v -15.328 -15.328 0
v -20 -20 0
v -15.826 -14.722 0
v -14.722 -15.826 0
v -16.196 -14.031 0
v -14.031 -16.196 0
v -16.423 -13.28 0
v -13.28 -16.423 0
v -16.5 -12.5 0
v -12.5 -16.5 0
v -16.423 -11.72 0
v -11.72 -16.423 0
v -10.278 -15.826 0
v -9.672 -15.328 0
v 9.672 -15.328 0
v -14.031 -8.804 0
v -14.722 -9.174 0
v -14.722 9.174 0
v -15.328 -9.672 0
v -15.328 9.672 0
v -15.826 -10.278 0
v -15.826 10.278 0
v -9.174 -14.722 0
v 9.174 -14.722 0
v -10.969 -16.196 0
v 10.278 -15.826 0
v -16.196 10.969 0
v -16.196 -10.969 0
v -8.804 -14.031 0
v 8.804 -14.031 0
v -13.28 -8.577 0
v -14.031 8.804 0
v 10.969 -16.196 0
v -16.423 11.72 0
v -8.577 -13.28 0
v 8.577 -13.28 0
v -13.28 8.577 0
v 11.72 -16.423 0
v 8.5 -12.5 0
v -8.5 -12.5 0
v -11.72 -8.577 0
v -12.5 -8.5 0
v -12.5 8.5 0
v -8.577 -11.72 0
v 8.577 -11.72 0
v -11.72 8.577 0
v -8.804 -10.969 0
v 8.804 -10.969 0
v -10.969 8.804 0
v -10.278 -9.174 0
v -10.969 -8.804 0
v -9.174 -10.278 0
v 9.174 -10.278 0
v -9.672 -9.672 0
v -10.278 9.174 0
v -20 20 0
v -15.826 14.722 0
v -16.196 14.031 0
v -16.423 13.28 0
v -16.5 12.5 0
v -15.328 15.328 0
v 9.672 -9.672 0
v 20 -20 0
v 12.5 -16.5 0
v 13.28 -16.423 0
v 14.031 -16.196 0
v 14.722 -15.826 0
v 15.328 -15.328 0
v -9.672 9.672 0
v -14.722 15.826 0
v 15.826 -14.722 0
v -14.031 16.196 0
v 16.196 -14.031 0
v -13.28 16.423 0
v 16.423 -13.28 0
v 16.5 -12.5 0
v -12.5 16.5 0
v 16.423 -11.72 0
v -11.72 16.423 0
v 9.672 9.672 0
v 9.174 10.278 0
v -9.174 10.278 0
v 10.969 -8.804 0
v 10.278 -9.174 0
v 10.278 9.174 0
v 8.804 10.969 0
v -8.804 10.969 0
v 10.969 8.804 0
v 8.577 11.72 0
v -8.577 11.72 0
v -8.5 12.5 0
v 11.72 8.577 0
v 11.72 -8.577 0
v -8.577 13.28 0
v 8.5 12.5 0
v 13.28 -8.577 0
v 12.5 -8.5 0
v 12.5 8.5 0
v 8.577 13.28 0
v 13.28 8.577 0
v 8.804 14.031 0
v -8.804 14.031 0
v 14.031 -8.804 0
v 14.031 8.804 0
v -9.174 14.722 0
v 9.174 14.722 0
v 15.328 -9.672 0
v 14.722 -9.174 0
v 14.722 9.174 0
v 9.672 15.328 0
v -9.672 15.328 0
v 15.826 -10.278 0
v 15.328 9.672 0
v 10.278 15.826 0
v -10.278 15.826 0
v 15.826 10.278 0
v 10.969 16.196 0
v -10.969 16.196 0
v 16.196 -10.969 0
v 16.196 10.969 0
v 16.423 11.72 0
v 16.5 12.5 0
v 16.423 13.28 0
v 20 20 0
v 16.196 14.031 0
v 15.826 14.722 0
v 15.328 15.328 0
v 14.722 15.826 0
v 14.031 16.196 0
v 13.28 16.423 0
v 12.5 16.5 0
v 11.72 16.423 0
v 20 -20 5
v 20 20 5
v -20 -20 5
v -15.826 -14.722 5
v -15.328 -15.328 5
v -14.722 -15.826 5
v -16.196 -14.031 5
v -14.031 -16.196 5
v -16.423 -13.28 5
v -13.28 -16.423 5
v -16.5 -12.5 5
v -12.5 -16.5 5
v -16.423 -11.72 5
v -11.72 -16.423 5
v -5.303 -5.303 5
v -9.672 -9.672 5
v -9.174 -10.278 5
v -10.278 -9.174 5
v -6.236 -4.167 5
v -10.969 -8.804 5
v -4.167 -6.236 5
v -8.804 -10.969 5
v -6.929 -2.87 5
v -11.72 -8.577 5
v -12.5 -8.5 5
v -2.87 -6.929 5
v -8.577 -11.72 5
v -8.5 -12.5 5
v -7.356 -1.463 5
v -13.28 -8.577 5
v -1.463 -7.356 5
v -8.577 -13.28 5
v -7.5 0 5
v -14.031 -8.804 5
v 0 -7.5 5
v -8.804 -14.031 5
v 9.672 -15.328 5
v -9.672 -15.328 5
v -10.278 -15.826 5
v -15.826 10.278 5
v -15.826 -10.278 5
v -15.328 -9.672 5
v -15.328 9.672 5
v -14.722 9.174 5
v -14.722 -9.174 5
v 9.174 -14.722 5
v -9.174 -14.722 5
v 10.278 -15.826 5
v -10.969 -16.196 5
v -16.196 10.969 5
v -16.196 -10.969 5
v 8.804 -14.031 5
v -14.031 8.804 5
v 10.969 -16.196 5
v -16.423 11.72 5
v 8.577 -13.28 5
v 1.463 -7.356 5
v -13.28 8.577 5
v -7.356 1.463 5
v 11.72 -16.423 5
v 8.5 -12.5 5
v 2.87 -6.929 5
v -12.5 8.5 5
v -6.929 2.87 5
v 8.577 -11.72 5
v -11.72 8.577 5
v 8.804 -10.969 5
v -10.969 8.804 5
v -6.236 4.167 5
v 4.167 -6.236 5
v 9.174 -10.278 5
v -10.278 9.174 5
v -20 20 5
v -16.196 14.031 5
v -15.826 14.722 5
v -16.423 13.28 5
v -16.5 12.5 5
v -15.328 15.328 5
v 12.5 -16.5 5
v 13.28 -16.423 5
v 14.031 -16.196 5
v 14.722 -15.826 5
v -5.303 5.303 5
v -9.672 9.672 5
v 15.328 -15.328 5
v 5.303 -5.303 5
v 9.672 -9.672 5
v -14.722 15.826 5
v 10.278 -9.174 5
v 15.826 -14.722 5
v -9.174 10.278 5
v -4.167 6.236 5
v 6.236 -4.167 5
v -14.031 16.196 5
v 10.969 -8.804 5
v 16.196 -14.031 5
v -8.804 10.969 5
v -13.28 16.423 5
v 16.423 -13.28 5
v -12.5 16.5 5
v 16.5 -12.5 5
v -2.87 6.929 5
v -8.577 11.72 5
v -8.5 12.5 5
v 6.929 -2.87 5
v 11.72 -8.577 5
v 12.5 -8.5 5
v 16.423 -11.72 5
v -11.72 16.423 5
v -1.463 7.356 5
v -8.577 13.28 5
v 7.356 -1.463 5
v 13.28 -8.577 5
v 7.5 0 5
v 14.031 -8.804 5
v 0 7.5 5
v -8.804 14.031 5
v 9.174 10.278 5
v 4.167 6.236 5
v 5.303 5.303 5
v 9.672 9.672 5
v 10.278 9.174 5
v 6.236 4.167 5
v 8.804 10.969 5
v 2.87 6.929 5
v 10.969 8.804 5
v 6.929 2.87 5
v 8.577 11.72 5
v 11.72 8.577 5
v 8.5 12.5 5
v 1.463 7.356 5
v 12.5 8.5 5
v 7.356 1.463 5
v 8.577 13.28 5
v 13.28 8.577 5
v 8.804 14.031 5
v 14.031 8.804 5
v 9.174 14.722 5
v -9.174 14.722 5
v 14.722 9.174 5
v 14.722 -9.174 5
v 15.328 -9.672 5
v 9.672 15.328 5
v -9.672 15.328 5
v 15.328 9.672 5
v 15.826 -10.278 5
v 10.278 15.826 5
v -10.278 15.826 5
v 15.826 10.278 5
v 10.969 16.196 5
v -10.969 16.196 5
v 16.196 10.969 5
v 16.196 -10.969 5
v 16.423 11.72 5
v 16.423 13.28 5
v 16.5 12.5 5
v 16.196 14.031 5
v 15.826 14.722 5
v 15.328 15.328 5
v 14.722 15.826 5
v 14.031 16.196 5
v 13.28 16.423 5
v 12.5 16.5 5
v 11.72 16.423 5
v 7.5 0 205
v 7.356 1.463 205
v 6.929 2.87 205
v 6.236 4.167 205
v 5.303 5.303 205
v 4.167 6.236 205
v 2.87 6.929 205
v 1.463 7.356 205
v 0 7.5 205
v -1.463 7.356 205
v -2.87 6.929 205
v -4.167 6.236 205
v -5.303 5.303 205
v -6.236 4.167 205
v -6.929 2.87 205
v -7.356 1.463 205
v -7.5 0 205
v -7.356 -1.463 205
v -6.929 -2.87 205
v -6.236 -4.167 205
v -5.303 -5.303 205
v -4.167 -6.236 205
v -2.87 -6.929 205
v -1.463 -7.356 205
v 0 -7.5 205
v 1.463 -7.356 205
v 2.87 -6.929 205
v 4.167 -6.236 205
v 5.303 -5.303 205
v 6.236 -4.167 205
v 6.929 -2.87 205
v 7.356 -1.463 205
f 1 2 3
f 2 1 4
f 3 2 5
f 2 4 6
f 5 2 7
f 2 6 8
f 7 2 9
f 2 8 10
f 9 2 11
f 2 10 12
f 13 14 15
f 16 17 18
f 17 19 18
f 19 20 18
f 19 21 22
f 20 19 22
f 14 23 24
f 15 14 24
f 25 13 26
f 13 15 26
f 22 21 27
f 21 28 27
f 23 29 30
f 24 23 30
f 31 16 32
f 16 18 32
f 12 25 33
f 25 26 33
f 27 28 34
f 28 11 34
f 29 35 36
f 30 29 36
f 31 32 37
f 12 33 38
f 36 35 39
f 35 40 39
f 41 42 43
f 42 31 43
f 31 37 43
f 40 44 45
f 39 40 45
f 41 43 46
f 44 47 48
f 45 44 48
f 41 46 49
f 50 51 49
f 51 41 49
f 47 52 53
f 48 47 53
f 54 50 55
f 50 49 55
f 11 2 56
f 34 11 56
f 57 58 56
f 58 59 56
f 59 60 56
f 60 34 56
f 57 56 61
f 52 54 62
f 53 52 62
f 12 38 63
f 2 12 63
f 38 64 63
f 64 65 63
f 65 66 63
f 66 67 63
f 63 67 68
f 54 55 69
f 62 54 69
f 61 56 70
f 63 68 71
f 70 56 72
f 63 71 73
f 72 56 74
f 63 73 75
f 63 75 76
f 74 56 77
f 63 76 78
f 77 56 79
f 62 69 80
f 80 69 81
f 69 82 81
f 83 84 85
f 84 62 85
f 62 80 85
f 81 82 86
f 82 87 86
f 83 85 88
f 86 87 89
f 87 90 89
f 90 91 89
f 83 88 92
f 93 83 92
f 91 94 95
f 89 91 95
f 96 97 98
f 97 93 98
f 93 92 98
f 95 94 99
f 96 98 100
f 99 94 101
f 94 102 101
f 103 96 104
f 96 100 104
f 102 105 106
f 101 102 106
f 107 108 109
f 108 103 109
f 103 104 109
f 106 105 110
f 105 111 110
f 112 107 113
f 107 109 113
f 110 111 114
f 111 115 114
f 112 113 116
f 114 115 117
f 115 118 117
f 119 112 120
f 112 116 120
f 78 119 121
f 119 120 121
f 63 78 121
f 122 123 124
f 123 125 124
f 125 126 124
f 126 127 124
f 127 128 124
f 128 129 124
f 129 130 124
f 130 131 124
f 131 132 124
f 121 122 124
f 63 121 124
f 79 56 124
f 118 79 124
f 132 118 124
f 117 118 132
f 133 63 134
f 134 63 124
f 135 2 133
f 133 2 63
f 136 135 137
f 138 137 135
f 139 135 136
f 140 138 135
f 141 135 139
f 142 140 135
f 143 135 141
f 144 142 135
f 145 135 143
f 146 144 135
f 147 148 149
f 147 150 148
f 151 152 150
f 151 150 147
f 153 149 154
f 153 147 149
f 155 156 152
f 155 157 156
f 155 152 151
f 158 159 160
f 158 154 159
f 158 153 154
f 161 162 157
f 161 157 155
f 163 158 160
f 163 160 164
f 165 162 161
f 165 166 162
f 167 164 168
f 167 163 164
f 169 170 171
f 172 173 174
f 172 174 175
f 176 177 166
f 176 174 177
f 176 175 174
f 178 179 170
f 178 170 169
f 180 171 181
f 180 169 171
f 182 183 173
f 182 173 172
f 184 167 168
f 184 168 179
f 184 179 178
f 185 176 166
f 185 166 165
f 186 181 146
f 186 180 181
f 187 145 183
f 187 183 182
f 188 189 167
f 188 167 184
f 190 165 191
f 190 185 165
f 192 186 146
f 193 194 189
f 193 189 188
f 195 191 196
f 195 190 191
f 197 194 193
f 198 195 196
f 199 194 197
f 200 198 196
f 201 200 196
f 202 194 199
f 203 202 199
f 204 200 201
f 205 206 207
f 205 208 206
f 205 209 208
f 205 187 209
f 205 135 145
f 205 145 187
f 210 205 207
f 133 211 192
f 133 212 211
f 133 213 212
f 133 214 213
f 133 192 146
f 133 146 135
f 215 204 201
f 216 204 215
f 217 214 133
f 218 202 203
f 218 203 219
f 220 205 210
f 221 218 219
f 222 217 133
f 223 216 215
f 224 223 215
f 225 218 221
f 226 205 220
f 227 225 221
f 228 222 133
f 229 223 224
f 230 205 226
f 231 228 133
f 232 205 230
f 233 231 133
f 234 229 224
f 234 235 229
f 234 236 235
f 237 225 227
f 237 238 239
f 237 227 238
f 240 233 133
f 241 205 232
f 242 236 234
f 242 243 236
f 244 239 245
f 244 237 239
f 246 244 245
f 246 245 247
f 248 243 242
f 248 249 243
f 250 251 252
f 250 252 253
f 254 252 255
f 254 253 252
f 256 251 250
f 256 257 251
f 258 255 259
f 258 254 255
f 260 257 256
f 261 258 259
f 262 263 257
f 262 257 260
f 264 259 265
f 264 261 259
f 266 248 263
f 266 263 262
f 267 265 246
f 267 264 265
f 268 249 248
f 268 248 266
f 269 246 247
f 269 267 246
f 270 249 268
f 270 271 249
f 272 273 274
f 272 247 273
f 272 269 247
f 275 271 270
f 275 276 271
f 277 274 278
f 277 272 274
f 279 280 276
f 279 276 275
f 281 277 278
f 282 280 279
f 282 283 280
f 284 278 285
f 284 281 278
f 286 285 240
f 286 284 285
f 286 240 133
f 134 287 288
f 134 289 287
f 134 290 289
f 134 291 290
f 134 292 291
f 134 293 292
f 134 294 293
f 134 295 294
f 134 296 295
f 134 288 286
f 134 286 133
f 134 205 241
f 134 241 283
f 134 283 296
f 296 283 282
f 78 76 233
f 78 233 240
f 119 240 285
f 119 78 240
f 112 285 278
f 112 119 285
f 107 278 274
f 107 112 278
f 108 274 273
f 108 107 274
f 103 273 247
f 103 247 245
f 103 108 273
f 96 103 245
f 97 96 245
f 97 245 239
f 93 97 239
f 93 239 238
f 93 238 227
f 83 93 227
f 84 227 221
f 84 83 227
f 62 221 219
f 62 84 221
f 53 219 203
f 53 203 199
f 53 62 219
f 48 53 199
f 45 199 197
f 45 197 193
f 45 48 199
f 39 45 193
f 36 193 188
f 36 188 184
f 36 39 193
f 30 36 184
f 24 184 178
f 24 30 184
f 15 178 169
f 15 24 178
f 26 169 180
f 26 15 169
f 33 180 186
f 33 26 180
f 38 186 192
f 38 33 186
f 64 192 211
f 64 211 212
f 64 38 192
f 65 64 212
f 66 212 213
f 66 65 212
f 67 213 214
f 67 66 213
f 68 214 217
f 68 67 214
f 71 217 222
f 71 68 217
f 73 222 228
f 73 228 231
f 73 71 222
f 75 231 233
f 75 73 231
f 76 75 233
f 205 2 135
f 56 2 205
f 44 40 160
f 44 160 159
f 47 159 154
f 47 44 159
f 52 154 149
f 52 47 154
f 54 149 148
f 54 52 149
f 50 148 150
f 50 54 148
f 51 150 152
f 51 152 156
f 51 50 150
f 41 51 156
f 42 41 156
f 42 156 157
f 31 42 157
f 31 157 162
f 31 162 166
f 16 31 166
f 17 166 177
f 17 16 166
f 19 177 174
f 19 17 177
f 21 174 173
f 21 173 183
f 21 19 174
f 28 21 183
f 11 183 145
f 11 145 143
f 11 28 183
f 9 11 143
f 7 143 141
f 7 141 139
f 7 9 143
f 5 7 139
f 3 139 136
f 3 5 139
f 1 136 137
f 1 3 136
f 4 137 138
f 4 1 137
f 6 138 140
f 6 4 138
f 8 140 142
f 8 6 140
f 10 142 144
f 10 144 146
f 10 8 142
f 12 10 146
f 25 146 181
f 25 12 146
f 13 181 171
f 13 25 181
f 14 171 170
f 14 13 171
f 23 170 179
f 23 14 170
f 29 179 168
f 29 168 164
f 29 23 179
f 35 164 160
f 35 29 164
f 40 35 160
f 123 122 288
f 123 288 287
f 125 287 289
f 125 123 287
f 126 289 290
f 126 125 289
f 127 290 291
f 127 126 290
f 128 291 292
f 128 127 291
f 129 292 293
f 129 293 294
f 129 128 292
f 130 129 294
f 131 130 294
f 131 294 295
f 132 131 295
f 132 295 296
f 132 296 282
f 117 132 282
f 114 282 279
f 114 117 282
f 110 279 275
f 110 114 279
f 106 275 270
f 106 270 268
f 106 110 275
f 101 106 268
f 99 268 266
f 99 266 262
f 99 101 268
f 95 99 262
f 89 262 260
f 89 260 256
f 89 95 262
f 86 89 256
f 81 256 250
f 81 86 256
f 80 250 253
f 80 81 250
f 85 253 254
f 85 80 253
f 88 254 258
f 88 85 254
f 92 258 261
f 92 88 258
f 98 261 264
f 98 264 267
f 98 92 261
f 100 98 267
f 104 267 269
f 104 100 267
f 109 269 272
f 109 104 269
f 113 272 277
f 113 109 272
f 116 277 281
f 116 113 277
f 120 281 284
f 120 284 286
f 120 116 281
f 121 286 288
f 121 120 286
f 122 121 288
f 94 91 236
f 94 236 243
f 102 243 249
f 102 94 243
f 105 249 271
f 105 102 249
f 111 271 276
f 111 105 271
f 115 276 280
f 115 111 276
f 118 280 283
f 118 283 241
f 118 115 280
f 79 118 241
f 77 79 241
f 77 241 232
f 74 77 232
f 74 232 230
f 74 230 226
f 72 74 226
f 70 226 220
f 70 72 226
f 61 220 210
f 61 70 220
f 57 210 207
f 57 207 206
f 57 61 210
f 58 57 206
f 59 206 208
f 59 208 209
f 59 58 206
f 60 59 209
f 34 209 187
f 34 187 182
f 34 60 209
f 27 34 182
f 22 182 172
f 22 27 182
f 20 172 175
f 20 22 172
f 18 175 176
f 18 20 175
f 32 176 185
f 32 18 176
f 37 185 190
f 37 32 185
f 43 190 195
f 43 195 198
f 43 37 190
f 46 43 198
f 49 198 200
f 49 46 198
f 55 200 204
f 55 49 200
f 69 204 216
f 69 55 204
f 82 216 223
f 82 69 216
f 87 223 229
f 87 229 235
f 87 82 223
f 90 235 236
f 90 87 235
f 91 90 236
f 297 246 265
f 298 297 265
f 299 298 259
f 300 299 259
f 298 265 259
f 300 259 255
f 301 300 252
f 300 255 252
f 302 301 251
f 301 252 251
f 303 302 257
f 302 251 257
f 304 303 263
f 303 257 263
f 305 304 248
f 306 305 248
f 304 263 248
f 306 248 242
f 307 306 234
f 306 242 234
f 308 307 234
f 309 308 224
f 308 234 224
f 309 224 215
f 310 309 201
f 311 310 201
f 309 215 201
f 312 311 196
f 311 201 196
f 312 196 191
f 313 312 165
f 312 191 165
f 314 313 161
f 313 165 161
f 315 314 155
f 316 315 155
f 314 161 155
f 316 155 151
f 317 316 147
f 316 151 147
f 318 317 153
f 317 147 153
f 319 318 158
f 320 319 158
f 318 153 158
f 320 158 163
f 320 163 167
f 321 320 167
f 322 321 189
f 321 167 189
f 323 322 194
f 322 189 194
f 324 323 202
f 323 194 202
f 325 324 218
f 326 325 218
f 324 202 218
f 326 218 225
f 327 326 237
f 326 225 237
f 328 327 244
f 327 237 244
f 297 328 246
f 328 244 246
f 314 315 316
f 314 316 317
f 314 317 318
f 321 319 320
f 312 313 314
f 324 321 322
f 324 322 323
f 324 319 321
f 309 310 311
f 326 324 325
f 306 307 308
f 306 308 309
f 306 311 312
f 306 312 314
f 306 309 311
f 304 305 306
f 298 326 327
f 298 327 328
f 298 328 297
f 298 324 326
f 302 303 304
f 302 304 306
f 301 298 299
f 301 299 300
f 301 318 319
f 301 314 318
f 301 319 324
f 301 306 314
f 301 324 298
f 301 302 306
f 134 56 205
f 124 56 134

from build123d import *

# Parameters (mm, degrees)
SKETCH_1_W      = 40
SKETCH_1_H      = 40
SKETCH_1_R      = 4
EXTRUDE_1_DEPTH = 5
SKETCH_2_R      = 7.5
EXTRUDE_2_DEPTH = 200


with BuildPart() as part:
    # 草图1 → 凸台-拉伸1 (new body)
    with BuildSketch(Plane.XY):
        Rectangle(SKETCH_1_W, SKETCH_1_H)
        with Locations((-12.5, 12.5)):
            Circle(SKETCH_1_R, mode=Mode.SUBTRACT)
        with Locations((12.5, 12.5)):
            Circle(SKETCH_1_R, mode=Mode.SUBTRACT)
        with Locations((12.5, -12.5)):
            Circle(SKETCH_1_R, mode=Mode.SUBTRACT)
        with Locations((-12.5, -12.5)):
            Circle(SKETCH_1_R, mode=Mode.SUBTRACT)
    extrude(amount=EXTRUDE_1_DEPTH)

    # 草图2 → 凸台-拉伸2 (add)
    with BuildSketch(Plane.XY.offset(5)):
        Circle(SKETCH_2_R)
    extrude(amount=EXTRUDE_2_DEPTH)


solid = part.part
